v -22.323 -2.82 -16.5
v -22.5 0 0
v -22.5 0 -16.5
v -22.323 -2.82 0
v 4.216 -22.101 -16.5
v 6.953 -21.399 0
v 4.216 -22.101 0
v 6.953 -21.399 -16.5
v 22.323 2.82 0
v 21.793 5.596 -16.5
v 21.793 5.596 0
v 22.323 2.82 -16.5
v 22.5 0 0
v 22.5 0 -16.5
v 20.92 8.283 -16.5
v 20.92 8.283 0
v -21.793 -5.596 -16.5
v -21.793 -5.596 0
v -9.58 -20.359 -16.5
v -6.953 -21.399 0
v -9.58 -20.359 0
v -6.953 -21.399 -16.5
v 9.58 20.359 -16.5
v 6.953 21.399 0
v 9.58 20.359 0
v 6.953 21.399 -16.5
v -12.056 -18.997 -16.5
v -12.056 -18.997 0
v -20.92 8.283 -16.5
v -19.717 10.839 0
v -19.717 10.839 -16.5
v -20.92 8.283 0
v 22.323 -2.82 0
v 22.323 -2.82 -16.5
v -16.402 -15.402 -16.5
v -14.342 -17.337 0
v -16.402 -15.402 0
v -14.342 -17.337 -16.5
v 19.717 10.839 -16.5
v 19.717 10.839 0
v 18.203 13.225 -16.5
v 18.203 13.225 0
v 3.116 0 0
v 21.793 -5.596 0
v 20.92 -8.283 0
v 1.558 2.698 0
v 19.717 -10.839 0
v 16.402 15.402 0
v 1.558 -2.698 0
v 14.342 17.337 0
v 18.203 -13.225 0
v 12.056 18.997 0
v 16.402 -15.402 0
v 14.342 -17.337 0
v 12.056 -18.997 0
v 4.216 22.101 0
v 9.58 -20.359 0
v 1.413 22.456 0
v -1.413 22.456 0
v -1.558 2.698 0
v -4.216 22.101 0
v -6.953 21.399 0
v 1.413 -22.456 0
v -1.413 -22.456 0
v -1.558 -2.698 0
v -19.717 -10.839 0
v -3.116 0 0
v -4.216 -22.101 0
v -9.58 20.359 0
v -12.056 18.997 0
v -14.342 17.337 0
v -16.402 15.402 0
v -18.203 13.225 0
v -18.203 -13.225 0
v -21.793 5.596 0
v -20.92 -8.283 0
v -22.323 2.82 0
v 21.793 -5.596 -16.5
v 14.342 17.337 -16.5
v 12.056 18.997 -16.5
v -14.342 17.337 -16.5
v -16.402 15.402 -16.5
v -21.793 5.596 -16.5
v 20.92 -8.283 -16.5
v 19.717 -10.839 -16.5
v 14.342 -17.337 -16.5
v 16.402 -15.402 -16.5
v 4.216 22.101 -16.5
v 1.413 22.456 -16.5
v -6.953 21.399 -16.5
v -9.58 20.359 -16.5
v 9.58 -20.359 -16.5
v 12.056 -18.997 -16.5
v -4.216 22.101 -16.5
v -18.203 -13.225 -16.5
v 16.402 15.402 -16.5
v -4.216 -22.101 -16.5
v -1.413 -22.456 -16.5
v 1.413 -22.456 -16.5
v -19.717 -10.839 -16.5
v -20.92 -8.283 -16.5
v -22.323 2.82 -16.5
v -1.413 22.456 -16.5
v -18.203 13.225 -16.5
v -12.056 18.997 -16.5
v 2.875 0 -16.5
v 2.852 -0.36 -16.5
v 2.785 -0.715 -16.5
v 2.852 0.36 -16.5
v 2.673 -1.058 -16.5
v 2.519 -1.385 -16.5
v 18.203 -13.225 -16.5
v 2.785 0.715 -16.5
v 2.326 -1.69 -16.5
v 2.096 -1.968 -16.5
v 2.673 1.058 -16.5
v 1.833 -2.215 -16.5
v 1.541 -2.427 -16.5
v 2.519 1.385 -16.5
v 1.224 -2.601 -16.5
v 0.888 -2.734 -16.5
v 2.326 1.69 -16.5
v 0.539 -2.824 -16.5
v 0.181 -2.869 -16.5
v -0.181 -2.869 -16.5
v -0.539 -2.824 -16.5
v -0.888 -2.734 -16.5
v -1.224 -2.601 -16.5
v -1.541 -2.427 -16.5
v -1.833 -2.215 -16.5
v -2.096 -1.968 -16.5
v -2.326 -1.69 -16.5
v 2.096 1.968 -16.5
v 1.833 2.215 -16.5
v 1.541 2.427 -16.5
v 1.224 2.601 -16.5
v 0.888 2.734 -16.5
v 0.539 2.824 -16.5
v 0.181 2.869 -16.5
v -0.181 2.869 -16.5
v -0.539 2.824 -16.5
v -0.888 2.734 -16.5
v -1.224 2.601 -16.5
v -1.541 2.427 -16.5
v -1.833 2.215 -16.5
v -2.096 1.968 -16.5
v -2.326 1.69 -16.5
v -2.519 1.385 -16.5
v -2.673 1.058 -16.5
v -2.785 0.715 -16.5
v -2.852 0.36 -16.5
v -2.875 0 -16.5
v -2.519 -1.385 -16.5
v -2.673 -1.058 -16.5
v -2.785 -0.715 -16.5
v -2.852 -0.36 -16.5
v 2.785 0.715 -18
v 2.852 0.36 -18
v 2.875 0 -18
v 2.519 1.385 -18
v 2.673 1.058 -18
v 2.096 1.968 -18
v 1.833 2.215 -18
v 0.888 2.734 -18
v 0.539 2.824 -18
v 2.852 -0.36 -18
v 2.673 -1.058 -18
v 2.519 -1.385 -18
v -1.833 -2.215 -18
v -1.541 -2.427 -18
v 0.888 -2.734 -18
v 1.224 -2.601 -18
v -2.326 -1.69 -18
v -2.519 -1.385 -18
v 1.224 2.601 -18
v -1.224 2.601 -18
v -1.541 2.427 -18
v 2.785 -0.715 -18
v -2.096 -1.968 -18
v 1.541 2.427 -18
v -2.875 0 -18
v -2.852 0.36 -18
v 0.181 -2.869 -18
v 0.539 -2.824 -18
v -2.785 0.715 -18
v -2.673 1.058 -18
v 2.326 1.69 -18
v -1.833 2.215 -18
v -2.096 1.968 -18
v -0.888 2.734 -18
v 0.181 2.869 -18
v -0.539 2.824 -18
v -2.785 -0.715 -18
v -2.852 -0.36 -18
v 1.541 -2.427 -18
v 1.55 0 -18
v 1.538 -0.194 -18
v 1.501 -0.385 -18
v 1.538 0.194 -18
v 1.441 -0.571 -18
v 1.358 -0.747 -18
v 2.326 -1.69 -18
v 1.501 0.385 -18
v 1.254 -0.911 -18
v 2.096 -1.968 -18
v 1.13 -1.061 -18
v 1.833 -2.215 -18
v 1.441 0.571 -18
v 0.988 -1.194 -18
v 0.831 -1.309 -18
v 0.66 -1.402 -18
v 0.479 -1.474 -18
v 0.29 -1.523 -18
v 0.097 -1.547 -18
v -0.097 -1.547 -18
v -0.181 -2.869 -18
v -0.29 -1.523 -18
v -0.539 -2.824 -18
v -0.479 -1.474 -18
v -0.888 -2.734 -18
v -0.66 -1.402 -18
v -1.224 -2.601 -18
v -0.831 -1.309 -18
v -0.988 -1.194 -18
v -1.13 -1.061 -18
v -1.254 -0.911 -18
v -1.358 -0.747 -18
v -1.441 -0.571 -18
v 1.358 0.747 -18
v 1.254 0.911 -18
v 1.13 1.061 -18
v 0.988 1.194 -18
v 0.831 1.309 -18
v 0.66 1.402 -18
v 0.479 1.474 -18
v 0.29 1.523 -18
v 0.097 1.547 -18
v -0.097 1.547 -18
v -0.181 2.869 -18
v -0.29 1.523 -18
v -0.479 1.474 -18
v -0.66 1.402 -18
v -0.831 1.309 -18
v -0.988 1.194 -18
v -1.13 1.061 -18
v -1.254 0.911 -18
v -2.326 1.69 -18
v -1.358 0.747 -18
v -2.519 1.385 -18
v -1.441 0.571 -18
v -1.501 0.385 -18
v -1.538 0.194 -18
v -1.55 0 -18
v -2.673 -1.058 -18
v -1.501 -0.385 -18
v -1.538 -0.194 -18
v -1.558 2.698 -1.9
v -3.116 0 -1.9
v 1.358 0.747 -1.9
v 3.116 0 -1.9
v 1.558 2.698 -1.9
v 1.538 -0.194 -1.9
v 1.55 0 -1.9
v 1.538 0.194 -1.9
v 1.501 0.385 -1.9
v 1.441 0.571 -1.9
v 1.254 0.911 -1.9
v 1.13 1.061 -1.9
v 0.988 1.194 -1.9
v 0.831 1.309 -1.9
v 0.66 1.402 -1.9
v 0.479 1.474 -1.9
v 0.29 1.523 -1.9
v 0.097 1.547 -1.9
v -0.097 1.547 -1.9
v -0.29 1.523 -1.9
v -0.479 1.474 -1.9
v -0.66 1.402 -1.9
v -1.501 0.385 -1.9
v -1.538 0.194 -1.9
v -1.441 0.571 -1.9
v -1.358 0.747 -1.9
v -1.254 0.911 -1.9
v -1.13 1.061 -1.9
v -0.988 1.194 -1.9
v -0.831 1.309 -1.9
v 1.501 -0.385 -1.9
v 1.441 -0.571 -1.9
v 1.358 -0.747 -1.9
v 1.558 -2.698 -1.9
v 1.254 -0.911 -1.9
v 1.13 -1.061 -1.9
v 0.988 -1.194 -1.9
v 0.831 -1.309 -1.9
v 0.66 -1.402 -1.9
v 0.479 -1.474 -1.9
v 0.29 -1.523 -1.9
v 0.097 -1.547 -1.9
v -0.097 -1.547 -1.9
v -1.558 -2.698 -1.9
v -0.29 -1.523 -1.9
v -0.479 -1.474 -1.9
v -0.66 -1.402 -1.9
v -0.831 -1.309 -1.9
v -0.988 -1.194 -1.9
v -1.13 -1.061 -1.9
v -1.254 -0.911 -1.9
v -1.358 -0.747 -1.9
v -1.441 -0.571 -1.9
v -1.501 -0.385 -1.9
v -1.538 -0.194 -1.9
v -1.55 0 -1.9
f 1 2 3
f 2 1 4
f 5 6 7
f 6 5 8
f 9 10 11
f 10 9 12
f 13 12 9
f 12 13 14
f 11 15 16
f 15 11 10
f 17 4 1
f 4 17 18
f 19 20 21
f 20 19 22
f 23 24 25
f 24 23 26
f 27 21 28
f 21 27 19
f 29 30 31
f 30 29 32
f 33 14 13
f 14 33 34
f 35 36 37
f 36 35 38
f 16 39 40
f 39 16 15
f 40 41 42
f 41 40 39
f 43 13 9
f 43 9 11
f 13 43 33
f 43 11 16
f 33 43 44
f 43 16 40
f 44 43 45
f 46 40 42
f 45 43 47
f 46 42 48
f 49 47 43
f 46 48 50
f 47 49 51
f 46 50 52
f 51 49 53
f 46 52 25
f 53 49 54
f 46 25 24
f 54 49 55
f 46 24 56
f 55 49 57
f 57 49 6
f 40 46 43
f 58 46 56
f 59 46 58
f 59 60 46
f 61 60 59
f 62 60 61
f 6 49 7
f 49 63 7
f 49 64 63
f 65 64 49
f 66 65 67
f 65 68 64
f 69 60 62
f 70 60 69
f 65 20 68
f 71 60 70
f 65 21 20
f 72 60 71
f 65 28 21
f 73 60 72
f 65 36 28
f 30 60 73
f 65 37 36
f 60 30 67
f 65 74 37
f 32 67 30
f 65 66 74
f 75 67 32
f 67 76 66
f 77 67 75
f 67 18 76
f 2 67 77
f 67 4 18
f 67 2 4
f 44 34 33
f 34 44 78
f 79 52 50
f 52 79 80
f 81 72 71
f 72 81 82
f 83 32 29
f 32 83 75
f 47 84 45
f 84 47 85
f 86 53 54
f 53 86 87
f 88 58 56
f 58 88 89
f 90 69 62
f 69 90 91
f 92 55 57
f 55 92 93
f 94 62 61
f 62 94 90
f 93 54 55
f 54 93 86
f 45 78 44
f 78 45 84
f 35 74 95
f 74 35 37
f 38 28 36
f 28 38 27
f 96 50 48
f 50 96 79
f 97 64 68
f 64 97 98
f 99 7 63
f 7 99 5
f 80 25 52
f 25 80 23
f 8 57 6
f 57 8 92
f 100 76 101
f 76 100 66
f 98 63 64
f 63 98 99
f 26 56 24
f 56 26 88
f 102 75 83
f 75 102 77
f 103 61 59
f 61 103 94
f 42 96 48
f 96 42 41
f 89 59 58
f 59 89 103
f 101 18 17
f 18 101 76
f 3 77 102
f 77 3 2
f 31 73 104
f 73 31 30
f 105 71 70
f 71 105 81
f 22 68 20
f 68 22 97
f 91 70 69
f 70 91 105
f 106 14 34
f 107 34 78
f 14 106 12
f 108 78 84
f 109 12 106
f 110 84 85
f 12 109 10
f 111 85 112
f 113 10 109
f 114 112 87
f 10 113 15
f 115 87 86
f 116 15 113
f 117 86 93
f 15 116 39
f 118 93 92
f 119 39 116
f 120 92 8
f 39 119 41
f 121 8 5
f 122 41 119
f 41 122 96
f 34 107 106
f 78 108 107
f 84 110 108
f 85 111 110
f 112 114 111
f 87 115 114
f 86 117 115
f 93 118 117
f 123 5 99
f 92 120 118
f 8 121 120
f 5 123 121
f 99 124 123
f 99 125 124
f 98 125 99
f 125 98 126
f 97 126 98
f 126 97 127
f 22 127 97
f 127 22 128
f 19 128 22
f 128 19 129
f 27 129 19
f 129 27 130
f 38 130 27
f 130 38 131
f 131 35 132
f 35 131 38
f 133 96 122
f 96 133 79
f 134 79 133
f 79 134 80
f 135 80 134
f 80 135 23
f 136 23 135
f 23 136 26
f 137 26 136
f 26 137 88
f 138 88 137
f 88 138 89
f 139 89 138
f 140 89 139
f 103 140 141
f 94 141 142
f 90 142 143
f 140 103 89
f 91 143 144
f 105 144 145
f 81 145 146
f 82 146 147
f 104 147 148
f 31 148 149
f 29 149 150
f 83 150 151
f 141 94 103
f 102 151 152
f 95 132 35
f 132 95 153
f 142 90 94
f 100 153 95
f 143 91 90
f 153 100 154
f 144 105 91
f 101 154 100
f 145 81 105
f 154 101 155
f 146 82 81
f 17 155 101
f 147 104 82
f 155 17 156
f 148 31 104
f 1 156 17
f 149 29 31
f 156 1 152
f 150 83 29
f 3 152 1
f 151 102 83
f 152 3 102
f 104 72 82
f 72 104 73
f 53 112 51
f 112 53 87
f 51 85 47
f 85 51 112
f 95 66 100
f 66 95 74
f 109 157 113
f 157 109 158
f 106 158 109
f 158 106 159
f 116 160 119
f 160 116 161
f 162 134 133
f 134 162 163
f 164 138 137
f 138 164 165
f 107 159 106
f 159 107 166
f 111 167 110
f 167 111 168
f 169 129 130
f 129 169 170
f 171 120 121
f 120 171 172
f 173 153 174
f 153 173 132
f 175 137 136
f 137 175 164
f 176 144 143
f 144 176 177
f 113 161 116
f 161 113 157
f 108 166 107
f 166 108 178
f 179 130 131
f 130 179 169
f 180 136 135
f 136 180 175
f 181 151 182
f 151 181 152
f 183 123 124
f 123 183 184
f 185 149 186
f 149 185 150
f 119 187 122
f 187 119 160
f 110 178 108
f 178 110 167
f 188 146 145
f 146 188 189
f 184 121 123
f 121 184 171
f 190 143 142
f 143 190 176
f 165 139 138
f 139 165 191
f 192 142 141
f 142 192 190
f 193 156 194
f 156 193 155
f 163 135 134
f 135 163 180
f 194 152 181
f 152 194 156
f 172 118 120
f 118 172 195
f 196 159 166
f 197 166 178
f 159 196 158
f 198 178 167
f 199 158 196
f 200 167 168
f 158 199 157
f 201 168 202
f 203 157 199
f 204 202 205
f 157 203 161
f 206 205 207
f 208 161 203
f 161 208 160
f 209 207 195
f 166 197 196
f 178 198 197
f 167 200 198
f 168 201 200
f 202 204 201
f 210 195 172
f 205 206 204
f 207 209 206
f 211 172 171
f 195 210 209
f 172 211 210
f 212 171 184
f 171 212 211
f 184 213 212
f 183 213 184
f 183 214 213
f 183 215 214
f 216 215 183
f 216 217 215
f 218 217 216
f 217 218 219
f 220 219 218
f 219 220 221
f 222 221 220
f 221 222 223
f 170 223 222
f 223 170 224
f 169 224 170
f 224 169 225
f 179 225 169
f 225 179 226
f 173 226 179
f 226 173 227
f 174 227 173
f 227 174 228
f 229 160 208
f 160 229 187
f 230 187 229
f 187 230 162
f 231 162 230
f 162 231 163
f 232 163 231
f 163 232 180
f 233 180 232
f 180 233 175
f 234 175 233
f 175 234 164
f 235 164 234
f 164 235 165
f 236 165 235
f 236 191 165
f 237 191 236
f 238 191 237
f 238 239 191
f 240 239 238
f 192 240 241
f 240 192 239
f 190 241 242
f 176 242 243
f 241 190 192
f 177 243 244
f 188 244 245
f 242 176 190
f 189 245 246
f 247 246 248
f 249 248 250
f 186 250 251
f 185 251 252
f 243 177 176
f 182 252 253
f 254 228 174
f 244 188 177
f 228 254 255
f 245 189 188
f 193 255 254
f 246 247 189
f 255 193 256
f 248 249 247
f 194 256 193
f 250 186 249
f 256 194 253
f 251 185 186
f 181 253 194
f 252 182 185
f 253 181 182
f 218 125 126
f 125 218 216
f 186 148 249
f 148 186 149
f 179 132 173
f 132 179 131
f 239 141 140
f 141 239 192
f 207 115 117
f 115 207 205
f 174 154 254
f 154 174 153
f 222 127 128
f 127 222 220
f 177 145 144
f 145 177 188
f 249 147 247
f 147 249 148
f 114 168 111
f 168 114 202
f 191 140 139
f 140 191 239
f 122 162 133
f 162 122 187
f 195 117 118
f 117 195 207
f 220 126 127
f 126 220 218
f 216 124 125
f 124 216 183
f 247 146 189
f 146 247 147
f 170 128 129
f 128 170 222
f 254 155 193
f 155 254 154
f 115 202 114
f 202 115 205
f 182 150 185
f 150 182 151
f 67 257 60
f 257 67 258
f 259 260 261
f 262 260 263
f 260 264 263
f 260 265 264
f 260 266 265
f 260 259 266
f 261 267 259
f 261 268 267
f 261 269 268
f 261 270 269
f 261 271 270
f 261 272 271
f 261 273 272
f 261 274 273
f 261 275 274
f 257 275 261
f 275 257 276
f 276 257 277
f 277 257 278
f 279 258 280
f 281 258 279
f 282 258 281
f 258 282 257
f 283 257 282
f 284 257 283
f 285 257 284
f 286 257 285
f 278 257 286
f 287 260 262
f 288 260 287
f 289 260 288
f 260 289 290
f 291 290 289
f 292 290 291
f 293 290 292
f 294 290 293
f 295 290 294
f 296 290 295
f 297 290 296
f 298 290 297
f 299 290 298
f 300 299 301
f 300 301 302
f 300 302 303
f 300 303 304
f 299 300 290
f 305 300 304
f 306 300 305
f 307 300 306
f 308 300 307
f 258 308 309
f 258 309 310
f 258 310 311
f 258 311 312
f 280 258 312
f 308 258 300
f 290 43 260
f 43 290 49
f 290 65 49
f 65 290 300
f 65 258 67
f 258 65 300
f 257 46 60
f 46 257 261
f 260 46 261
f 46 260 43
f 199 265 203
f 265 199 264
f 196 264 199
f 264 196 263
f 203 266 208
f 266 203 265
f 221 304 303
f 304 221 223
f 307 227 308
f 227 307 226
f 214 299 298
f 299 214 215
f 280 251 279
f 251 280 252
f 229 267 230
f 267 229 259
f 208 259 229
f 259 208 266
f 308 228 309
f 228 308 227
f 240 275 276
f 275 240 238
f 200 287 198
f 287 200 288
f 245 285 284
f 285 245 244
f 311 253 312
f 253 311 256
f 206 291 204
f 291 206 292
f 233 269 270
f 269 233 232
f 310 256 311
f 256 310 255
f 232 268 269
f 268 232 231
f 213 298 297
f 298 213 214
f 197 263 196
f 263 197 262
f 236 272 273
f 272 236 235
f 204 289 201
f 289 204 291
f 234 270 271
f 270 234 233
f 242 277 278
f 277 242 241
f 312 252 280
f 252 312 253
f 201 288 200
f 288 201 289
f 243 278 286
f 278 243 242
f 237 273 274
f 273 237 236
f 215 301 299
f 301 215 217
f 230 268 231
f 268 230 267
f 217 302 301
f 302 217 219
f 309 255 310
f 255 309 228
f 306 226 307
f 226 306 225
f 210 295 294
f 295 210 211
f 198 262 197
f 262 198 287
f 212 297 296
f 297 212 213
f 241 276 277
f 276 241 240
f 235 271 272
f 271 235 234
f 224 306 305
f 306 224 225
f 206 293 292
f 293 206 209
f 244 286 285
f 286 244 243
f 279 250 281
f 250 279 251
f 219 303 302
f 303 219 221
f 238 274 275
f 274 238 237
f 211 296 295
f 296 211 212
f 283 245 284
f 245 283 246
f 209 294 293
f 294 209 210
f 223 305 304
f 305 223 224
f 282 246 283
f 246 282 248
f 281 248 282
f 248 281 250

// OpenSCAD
$fn = 50;

difference() {
	union() {
		translate(v = [0, 0, -16.5]) {
			cylinder(h = 16.5, r = 22.5);
		}
		#translate(v = [0, 0, -18.0]) {
			cylinder(h = 18, r = 2.875);
		}
	}
	union() {
		translate(v = [0, 0, 0]) {
			rotate(a = [0, 0, 0]) {
				difference() {
					union() {
						translate(v = [0, 0, -1.9]) {
							linear_extrude(height = 1.9) {
								polygon(points = [[3.1158, 0.0], [1.5579000000000005, 2.698361953111554], [-1.5578999999999994, 2.6983619531115544], [-3.1158, 3.815754496783323e-16], [-1.5579000000000014, -2.6983619531115535], [1.557899999999998, -2.6983619531115552]]);
							}
						}
					}
					union();
				}
			}
		}
		#translate(v = [0, 0, -100.0]) {
			cylinder(h = 200, r = 1.55);
		}
	}
}
